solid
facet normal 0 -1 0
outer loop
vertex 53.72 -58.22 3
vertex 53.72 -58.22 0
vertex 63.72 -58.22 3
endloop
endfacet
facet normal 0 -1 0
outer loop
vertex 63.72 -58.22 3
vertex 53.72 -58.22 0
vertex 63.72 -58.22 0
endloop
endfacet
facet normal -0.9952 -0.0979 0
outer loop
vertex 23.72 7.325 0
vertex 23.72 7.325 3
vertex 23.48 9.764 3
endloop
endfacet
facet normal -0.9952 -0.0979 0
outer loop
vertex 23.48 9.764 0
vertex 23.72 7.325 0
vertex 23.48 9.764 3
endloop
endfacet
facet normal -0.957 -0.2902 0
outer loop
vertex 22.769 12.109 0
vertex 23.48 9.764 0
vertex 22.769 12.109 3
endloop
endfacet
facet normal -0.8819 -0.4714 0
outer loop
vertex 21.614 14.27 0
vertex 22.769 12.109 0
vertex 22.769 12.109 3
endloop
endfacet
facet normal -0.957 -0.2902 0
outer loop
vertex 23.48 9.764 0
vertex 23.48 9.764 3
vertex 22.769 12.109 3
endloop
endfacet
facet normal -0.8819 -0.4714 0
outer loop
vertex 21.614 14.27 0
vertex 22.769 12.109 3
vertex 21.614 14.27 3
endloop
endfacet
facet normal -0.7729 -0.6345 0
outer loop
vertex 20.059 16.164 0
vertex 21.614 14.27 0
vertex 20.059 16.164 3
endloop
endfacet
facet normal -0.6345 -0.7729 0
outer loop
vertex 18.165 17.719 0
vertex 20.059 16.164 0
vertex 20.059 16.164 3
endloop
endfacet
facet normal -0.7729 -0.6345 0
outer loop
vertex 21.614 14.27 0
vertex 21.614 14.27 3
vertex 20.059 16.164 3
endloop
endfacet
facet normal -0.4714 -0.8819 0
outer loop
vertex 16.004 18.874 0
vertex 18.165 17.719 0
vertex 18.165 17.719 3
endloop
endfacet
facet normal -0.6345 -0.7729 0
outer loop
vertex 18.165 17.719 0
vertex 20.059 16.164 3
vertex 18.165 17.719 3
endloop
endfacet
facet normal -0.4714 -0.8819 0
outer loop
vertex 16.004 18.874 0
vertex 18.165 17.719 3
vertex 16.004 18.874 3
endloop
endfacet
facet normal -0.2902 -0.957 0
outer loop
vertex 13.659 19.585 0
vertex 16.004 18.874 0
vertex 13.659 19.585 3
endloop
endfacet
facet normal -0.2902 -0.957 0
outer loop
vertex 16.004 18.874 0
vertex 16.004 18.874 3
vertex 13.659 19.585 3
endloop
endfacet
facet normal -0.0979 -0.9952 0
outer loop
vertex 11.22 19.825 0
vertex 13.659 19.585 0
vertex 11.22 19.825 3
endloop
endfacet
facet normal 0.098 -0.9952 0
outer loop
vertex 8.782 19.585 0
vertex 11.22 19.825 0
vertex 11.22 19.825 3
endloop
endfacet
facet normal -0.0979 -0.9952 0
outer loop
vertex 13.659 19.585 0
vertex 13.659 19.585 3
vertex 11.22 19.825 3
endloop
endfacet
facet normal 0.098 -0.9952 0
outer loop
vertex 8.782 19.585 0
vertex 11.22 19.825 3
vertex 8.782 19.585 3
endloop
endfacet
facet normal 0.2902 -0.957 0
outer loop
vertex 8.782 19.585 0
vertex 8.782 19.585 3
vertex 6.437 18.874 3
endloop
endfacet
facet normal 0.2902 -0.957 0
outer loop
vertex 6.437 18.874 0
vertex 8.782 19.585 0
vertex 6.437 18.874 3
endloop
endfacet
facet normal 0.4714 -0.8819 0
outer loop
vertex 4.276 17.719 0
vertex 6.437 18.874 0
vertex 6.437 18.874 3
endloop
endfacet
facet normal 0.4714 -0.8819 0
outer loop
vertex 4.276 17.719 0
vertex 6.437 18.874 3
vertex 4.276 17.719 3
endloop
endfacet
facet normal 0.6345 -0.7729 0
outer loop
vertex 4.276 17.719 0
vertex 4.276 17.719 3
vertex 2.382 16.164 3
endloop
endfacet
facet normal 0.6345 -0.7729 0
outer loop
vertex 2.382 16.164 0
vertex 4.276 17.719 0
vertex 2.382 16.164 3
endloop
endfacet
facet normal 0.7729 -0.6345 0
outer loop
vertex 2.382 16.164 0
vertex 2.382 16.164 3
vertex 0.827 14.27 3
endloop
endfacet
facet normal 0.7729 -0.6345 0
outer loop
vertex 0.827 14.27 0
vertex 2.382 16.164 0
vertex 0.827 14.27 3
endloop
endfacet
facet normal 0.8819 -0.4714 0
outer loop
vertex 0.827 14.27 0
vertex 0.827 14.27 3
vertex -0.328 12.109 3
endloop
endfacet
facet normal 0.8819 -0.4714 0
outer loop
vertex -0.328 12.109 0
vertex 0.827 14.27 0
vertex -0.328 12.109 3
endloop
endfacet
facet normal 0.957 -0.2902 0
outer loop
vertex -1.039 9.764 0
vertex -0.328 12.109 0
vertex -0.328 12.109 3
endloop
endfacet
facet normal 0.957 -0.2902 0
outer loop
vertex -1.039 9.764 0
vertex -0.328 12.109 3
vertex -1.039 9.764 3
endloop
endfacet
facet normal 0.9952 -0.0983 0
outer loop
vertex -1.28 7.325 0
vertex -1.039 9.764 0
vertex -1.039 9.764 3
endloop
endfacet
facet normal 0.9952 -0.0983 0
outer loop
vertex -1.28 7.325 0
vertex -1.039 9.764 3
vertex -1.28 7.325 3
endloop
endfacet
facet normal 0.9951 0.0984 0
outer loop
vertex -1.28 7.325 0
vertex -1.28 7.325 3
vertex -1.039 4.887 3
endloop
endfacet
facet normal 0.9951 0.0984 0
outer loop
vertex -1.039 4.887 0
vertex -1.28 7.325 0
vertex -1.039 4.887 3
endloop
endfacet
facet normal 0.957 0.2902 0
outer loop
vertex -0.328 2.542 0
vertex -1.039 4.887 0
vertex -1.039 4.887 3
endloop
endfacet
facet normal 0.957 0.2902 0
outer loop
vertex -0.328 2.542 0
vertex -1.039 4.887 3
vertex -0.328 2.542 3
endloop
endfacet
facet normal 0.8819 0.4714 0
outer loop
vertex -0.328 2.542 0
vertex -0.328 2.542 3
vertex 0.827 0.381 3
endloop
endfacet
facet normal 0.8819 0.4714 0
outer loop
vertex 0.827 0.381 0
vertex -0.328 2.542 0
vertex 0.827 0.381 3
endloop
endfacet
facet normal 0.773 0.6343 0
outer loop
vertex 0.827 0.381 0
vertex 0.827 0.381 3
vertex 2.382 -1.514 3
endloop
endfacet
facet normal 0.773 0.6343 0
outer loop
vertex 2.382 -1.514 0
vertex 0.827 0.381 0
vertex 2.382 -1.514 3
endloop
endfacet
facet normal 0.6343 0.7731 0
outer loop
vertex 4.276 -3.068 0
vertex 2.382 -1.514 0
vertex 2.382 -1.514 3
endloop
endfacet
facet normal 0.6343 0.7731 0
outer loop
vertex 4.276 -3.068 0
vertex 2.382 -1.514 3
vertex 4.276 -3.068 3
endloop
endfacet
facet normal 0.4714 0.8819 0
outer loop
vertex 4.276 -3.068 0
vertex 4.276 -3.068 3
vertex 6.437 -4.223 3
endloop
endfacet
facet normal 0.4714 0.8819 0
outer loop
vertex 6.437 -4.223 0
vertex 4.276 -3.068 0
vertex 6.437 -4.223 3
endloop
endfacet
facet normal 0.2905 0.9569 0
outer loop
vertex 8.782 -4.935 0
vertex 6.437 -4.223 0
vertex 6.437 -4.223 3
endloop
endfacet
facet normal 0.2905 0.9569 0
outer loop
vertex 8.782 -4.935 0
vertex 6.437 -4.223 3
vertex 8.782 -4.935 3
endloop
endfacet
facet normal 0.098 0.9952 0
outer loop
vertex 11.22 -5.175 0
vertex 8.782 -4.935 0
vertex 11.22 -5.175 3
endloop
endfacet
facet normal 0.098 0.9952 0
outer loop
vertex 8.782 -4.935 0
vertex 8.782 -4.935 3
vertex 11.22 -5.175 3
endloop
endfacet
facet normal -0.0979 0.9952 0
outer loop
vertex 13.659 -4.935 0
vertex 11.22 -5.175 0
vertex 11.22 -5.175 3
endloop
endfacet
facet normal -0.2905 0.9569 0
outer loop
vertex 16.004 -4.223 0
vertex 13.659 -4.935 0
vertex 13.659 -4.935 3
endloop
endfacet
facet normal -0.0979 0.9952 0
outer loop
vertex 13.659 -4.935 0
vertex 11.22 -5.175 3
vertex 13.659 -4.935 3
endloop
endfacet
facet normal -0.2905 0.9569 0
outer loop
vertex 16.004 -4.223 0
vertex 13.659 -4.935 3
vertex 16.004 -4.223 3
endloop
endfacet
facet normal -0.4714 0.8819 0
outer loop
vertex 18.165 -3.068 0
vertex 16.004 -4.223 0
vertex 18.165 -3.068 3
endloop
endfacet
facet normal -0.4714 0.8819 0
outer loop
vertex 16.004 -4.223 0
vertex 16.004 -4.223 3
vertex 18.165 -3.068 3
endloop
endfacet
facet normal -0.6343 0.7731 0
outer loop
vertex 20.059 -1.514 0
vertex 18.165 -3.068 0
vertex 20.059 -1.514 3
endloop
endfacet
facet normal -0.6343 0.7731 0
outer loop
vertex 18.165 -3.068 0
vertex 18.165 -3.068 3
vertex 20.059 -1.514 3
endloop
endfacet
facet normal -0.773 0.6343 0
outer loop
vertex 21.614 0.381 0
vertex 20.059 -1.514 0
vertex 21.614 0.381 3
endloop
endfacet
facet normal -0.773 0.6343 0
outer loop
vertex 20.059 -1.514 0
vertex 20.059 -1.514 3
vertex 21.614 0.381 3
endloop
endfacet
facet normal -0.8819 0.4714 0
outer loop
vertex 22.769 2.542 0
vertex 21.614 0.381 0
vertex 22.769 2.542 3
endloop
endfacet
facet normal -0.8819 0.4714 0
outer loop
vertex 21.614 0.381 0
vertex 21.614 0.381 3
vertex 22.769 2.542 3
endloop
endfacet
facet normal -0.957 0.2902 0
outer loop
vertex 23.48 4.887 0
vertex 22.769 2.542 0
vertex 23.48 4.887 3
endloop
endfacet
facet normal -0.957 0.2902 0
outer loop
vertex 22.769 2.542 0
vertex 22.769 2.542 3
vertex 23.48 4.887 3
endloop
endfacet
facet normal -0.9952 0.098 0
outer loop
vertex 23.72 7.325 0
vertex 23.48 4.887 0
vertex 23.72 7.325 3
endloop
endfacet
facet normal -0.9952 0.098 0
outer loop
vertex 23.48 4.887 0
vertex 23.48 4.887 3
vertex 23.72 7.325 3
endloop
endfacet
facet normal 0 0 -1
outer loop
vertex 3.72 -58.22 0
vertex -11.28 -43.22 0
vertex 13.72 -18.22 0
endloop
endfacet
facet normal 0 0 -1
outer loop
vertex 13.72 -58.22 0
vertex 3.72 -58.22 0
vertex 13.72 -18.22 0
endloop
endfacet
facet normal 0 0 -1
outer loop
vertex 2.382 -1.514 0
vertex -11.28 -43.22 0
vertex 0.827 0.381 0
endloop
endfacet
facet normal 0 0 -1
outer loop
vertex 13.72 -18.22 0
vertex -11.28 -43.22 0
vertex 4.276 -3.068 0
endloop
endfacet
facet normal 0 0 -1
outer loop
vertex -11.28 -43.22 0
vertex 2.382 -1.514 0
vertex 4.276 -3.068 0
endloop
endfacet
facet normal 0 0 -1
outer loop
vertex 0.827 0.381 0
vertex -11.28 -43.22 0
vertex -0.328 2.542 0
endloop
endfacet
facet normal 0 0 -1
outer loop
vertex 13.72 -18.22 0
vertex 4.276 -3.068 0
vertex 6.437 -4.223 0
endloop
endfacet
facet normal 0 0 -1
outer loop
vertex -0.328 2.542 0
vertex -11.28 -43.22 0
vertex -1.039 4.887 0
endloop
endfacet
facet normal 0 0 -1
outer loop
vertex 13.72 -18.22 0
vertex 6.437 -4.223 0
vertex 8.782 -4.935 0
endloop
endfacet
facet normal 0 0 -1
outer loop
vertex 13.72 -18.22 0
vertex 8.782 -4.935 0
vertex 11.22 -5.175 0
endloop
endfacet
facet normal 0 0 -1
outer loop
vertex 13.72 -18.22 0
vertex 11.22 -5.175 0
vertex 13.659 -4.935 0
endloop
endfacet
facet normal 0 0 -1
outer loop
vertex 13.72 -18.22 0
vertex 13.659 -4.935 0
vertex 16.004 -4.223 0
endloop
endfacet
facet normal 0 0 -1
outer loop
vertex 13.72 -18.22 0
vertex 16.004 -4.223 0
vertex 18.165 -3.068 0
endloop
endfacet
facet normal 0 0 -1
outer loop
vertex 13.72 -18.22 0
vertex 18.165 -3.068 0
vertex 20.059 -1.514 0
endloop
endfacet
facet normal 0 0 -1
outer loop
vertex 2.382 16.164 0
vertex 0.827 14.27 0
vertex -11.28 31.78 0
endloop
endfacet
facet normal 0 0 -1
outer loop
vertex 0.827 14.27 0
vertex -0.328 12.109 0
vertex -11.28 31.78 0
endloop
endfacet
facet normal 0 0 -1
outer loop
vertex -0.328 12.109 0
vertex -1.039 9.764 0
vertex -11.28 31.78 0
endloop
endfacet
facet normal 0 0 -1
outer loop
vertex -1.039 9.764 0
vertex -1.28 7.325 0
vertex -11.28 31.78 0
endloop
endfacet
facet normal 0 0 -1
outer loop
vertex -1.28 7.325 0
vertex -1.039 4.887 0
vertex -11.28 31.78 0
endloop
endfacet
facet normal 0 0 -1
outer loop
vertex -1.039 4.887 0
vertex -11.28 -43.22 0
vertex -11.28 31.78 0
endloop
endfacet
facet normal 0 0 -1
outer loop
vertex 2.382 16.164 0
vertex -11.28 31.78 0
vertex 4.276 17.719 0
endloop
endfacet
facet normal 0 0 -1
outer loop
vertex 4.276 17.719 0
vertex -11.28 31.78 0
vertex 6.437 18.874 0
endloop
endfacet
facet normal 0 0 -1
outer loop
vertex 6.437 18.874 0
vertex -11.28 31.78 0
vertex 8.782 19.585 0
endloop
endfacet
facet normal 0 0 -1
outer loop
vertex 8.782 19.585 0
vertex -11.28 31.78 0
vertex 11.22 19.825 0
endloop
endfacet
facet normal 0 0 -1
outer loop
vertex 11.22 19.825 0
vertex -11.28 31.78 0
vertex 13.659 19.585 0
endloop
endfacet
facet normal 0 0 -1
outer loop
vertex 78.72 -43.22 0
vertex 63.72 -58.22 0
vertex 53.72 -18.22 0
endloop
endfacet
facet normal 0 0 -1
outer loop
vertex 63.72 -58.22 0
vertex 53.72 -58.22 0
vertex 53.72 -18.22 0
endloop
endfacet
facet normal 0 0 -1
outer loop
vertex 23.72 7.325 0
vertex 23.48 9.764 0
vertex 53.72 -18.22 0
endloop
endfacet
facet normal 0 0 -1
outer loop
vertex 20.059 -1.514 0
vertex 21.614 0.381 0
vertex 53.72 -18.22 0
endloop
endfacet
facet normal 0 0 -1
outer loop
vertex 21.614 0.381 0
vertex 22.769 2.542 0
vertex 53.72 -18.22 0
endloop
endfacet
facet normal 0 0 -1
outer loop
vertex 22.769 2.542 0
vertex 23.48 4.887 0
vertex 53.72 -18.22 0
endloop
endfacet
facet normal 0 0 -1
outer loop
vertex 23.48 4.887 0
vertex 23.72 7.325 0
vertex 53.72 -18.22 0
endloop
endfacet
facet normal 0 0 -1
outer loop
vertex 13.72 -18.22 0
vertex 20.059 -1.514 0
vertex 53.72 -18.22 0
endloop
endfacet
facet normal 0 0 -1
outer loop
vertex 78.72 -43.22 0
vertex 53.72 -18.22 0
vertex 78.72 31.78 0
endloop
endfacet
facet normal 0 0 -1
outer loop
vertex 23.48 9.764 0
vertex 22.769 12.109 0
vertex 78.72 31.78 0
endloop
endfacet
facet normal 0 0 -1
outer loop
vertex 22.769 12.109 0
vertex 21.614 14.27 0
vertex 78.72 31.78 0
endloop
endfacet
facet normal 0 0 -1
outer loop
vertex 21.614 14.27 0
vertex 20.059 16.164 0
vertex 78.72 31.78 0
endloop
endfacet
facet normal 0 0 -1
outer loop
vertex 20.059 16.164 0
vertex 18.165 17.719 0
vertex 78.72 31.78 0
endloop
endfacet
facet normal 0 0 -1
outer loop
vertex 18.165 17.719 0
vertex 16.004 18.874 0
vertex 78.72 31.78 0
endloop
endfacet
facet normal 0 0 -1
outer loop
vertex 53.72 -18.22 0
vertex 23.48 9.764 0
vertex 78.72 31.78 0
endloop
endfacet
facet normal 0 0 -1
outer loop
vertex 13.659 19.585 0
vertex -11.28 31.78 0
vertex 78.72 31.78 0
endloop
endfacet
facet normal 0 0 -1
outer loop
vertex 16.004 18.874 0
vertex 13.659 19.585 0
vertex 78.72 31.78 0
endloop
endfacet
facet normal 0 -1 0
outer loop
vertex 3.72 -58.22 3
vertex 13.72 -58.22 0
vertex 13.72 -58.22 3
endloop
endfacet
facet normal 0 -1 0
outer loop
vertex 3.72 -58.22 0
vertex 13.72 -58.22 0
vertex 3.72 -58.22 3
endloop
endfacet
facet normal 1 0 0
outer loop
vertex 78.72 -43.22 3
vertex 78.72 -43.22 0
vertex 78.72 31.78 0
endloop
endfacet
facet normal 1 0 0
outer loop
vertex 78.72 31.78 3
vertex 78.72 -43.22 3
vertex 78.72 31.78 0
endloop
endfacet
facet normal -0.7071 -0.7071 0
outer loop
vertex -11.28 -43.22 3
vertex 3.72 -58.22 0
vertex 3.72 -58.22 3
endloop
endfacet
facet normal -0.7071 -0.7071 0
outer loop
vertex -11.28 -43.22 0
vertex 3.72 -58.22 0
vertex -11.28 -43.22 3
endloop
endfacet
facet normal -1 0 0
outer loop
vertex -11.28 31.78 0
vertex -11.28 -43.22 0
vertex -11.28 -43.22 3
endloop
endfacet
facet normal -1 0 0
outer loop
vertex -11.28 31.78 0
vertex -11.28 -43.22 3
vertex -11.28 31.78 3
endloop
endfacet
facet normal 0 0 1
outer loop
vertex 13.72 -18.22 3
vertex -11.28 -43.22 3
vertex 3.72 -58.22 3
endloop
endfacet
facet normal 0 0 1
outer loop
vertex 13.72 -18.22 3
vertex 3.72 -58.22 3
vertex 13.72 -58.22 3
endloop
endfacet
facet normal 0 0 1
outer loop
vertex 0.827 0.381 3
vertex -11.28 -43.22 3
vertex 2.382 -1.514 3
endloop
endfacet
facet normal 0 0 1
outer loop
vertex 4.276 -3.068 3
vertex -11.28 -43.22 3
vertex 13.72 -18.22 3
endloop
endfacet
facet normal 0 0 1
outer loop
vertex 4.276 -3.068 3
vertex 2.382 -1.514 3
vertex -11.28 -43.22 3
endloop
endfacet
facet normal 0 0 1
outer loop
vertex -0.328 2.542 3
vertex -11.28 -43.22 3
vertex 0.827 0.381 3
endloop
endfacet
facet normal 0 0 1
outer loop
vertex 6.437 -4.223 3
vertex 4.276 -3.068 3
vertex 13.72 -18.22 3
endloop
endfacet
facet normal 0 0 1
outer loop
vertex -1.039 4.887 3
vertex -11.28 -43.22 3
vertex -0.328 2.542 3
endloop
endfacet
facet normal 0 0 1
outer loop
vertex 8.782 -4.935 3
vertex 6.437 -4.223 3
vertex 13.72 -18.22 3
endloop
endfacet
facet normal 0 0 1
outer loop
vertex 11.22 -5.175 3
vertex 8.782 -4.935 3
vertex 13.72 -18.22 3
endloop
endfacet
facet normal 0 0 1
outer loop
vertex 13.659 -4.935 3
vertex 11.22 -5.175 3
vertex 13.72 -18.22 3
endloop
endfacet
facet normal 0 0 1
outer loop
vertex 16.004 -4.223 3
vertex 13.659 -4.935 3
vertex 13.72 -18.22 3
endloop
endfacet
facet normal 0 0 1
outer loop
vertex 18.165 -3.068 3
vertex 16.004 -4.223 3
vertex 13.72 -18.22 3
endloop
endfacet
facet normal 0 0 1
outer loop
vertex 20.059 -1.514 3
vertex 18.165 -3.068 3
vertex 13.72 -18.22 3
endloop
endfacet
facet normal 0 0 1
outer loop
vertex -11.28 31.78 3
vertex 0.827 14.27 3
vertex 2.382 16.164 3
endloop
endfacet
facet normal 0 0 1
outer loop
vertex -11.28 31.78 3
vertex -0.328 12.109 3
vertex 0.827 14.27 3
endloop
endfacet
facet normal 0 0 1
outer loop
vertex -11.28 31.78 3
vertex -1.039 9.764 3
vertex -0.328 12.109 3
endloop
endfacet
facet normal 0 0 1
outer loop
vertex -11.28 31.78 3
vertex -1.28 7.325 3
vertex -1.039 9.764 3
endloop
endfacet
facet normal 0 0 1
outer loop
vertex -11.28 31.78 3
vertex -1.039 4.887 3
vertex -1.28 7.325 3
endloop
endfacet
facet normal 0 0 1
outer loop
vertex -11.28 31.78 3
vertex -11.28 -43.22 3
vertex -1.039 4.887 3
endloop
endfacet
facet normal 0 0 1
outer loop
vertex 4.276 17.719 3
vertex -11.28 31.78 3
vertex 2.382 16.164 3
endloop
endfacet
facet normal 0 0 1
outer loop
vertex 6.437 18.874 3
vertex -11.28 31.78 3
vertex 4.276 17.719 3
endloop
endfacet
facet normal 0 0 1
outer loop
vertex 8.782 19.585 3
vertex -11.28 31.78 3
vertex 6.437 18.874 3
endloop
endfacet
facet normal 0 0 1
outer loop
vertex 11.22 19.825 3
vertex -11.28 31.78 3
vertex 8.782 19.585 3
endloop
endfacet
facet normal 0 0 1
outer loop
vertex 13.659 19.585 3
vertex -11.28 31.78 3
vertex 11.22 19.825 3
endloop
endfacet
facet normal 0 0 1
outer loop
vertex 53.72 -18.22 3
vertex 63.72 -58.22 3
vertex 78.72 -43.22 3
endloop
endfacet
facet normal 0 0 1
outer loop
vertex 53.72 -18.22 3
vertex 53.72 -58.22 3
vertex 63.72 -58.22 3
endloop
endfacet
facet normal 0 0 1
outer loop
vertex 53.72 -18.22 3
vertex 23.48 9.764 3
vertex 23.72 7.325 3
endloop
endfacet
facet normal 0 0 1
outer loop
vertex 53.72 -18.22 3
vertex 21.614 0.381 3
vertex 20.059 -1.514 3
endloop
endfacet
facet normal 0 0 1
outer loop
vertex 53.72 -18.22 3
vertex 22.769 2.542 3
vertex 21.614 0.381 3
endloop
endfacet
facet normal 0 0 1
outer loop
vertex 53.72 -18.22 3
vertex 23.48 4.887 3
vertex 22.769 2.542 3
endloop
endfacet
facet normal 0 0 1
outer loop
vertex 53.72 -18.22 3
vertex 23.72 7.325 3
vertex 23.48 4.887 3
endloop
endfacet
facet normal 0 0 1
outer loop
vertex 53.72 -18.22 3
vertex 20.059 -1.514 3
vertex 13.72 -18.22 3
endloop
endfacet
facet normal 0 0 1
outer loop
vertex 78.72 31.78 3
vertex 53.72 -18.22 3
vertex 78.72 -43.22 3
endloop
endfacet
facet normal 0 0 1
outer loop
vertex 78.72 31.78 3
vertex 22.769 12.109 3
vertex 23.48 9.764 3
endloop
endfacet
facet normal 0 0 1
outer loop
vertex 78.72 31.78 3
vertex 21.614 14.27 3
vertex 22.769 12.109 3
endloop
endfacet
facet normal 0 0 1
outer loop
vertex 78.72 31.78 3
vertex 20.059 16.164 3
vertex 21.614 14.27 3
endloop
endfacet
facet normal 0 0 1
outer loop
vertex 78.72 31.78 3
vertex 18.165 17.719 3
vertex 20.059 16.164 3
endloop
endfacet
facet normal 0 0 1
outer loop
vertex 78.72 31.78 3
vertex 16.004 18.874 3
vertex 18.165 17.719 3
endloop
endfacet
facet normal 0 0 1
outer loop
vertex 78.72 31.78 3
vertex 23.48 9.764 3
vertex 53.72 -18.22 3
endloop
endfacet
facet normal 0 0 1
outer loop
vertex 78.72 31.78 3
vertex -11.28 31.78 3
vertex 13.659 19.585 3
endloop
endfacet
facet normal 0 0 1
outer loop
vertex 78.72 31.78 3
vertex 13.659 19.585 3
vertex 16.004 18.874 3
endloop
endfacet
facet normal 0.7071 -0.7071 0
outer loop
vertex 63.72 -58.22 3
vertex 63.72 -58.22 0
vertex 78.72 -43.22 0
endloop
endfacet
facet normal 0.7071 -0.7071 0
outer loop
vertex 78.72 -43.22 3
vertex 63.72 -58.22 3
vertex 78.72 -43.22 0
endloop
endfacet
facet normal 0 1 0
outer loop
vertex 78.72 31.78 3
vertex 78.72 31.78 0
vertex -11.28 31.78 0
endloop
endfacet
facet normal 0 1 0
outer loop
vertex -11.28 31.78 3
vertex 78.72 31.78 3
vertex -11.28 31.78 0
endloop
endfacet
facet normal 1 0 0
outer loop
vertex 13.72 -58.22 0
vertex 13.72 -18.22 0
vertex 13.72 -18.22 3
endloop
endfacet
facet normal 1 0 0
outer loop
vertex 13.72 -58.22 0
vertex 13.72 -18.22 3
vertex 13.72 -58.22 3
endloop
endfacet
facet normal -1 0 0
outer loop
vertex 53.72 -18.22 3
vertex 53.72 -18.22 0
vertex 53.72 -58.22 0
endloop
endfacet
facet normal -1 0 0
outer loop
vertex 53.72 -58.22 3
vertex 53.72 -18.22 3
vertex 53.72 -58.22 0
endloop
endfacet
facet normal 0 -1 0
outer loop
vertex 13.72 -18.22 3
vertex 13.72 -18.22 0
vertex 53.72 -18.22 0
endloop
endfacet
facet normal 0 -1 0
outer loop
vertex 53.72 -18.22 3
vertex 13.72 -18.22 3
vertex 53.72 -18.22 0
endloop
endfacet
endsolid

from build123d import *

# Parameters (mm, degrees)
EXTRUSION1_DEPTH        = 3
ESQUISSE2_R             = 12.5
ENL_V_MAT_EXTRU_1_DEPTH = 98.956642072


with BuildPart() as part:
    # Esquisse1 → Extrusion1 (new body)
    with BuildSketch(Plane.XY):
        Polygon((3.720449438, -58.220224719), (-11.279550562, -43.220224719), (-11.279550562, 31.779775281), (33.720449438, 31.779775281), (33.720449438, -18.220224719), (13.720449438, -18.220224719), (13.720449438, -58.220224719), align=None)
    extrusion1 = extrude(amount=EXTRUSION1_DEPTH)

    # Symétrie1: Extrusion1 across plane
    add(extrusion1.mirror(Plane(origin=(33.720449438, 31.779775281, 3), x_dir=(0, 0, 1), z_dir=(-1, 0, 0))))

    # Esquisse2 → Enlèv. mat.-Extru.1 (cut, through all)
    with BuildSketch(Plane.XY.offset(3)):
        with Locations((11.220449438, 7.325247065)):
            Circle(ESQUISSE2_R)
    extrude(amount=-ENL_V_MAT_EXTRU_1_DEPTH, mode=Mode.SUBTRACT)


solid = part.part
